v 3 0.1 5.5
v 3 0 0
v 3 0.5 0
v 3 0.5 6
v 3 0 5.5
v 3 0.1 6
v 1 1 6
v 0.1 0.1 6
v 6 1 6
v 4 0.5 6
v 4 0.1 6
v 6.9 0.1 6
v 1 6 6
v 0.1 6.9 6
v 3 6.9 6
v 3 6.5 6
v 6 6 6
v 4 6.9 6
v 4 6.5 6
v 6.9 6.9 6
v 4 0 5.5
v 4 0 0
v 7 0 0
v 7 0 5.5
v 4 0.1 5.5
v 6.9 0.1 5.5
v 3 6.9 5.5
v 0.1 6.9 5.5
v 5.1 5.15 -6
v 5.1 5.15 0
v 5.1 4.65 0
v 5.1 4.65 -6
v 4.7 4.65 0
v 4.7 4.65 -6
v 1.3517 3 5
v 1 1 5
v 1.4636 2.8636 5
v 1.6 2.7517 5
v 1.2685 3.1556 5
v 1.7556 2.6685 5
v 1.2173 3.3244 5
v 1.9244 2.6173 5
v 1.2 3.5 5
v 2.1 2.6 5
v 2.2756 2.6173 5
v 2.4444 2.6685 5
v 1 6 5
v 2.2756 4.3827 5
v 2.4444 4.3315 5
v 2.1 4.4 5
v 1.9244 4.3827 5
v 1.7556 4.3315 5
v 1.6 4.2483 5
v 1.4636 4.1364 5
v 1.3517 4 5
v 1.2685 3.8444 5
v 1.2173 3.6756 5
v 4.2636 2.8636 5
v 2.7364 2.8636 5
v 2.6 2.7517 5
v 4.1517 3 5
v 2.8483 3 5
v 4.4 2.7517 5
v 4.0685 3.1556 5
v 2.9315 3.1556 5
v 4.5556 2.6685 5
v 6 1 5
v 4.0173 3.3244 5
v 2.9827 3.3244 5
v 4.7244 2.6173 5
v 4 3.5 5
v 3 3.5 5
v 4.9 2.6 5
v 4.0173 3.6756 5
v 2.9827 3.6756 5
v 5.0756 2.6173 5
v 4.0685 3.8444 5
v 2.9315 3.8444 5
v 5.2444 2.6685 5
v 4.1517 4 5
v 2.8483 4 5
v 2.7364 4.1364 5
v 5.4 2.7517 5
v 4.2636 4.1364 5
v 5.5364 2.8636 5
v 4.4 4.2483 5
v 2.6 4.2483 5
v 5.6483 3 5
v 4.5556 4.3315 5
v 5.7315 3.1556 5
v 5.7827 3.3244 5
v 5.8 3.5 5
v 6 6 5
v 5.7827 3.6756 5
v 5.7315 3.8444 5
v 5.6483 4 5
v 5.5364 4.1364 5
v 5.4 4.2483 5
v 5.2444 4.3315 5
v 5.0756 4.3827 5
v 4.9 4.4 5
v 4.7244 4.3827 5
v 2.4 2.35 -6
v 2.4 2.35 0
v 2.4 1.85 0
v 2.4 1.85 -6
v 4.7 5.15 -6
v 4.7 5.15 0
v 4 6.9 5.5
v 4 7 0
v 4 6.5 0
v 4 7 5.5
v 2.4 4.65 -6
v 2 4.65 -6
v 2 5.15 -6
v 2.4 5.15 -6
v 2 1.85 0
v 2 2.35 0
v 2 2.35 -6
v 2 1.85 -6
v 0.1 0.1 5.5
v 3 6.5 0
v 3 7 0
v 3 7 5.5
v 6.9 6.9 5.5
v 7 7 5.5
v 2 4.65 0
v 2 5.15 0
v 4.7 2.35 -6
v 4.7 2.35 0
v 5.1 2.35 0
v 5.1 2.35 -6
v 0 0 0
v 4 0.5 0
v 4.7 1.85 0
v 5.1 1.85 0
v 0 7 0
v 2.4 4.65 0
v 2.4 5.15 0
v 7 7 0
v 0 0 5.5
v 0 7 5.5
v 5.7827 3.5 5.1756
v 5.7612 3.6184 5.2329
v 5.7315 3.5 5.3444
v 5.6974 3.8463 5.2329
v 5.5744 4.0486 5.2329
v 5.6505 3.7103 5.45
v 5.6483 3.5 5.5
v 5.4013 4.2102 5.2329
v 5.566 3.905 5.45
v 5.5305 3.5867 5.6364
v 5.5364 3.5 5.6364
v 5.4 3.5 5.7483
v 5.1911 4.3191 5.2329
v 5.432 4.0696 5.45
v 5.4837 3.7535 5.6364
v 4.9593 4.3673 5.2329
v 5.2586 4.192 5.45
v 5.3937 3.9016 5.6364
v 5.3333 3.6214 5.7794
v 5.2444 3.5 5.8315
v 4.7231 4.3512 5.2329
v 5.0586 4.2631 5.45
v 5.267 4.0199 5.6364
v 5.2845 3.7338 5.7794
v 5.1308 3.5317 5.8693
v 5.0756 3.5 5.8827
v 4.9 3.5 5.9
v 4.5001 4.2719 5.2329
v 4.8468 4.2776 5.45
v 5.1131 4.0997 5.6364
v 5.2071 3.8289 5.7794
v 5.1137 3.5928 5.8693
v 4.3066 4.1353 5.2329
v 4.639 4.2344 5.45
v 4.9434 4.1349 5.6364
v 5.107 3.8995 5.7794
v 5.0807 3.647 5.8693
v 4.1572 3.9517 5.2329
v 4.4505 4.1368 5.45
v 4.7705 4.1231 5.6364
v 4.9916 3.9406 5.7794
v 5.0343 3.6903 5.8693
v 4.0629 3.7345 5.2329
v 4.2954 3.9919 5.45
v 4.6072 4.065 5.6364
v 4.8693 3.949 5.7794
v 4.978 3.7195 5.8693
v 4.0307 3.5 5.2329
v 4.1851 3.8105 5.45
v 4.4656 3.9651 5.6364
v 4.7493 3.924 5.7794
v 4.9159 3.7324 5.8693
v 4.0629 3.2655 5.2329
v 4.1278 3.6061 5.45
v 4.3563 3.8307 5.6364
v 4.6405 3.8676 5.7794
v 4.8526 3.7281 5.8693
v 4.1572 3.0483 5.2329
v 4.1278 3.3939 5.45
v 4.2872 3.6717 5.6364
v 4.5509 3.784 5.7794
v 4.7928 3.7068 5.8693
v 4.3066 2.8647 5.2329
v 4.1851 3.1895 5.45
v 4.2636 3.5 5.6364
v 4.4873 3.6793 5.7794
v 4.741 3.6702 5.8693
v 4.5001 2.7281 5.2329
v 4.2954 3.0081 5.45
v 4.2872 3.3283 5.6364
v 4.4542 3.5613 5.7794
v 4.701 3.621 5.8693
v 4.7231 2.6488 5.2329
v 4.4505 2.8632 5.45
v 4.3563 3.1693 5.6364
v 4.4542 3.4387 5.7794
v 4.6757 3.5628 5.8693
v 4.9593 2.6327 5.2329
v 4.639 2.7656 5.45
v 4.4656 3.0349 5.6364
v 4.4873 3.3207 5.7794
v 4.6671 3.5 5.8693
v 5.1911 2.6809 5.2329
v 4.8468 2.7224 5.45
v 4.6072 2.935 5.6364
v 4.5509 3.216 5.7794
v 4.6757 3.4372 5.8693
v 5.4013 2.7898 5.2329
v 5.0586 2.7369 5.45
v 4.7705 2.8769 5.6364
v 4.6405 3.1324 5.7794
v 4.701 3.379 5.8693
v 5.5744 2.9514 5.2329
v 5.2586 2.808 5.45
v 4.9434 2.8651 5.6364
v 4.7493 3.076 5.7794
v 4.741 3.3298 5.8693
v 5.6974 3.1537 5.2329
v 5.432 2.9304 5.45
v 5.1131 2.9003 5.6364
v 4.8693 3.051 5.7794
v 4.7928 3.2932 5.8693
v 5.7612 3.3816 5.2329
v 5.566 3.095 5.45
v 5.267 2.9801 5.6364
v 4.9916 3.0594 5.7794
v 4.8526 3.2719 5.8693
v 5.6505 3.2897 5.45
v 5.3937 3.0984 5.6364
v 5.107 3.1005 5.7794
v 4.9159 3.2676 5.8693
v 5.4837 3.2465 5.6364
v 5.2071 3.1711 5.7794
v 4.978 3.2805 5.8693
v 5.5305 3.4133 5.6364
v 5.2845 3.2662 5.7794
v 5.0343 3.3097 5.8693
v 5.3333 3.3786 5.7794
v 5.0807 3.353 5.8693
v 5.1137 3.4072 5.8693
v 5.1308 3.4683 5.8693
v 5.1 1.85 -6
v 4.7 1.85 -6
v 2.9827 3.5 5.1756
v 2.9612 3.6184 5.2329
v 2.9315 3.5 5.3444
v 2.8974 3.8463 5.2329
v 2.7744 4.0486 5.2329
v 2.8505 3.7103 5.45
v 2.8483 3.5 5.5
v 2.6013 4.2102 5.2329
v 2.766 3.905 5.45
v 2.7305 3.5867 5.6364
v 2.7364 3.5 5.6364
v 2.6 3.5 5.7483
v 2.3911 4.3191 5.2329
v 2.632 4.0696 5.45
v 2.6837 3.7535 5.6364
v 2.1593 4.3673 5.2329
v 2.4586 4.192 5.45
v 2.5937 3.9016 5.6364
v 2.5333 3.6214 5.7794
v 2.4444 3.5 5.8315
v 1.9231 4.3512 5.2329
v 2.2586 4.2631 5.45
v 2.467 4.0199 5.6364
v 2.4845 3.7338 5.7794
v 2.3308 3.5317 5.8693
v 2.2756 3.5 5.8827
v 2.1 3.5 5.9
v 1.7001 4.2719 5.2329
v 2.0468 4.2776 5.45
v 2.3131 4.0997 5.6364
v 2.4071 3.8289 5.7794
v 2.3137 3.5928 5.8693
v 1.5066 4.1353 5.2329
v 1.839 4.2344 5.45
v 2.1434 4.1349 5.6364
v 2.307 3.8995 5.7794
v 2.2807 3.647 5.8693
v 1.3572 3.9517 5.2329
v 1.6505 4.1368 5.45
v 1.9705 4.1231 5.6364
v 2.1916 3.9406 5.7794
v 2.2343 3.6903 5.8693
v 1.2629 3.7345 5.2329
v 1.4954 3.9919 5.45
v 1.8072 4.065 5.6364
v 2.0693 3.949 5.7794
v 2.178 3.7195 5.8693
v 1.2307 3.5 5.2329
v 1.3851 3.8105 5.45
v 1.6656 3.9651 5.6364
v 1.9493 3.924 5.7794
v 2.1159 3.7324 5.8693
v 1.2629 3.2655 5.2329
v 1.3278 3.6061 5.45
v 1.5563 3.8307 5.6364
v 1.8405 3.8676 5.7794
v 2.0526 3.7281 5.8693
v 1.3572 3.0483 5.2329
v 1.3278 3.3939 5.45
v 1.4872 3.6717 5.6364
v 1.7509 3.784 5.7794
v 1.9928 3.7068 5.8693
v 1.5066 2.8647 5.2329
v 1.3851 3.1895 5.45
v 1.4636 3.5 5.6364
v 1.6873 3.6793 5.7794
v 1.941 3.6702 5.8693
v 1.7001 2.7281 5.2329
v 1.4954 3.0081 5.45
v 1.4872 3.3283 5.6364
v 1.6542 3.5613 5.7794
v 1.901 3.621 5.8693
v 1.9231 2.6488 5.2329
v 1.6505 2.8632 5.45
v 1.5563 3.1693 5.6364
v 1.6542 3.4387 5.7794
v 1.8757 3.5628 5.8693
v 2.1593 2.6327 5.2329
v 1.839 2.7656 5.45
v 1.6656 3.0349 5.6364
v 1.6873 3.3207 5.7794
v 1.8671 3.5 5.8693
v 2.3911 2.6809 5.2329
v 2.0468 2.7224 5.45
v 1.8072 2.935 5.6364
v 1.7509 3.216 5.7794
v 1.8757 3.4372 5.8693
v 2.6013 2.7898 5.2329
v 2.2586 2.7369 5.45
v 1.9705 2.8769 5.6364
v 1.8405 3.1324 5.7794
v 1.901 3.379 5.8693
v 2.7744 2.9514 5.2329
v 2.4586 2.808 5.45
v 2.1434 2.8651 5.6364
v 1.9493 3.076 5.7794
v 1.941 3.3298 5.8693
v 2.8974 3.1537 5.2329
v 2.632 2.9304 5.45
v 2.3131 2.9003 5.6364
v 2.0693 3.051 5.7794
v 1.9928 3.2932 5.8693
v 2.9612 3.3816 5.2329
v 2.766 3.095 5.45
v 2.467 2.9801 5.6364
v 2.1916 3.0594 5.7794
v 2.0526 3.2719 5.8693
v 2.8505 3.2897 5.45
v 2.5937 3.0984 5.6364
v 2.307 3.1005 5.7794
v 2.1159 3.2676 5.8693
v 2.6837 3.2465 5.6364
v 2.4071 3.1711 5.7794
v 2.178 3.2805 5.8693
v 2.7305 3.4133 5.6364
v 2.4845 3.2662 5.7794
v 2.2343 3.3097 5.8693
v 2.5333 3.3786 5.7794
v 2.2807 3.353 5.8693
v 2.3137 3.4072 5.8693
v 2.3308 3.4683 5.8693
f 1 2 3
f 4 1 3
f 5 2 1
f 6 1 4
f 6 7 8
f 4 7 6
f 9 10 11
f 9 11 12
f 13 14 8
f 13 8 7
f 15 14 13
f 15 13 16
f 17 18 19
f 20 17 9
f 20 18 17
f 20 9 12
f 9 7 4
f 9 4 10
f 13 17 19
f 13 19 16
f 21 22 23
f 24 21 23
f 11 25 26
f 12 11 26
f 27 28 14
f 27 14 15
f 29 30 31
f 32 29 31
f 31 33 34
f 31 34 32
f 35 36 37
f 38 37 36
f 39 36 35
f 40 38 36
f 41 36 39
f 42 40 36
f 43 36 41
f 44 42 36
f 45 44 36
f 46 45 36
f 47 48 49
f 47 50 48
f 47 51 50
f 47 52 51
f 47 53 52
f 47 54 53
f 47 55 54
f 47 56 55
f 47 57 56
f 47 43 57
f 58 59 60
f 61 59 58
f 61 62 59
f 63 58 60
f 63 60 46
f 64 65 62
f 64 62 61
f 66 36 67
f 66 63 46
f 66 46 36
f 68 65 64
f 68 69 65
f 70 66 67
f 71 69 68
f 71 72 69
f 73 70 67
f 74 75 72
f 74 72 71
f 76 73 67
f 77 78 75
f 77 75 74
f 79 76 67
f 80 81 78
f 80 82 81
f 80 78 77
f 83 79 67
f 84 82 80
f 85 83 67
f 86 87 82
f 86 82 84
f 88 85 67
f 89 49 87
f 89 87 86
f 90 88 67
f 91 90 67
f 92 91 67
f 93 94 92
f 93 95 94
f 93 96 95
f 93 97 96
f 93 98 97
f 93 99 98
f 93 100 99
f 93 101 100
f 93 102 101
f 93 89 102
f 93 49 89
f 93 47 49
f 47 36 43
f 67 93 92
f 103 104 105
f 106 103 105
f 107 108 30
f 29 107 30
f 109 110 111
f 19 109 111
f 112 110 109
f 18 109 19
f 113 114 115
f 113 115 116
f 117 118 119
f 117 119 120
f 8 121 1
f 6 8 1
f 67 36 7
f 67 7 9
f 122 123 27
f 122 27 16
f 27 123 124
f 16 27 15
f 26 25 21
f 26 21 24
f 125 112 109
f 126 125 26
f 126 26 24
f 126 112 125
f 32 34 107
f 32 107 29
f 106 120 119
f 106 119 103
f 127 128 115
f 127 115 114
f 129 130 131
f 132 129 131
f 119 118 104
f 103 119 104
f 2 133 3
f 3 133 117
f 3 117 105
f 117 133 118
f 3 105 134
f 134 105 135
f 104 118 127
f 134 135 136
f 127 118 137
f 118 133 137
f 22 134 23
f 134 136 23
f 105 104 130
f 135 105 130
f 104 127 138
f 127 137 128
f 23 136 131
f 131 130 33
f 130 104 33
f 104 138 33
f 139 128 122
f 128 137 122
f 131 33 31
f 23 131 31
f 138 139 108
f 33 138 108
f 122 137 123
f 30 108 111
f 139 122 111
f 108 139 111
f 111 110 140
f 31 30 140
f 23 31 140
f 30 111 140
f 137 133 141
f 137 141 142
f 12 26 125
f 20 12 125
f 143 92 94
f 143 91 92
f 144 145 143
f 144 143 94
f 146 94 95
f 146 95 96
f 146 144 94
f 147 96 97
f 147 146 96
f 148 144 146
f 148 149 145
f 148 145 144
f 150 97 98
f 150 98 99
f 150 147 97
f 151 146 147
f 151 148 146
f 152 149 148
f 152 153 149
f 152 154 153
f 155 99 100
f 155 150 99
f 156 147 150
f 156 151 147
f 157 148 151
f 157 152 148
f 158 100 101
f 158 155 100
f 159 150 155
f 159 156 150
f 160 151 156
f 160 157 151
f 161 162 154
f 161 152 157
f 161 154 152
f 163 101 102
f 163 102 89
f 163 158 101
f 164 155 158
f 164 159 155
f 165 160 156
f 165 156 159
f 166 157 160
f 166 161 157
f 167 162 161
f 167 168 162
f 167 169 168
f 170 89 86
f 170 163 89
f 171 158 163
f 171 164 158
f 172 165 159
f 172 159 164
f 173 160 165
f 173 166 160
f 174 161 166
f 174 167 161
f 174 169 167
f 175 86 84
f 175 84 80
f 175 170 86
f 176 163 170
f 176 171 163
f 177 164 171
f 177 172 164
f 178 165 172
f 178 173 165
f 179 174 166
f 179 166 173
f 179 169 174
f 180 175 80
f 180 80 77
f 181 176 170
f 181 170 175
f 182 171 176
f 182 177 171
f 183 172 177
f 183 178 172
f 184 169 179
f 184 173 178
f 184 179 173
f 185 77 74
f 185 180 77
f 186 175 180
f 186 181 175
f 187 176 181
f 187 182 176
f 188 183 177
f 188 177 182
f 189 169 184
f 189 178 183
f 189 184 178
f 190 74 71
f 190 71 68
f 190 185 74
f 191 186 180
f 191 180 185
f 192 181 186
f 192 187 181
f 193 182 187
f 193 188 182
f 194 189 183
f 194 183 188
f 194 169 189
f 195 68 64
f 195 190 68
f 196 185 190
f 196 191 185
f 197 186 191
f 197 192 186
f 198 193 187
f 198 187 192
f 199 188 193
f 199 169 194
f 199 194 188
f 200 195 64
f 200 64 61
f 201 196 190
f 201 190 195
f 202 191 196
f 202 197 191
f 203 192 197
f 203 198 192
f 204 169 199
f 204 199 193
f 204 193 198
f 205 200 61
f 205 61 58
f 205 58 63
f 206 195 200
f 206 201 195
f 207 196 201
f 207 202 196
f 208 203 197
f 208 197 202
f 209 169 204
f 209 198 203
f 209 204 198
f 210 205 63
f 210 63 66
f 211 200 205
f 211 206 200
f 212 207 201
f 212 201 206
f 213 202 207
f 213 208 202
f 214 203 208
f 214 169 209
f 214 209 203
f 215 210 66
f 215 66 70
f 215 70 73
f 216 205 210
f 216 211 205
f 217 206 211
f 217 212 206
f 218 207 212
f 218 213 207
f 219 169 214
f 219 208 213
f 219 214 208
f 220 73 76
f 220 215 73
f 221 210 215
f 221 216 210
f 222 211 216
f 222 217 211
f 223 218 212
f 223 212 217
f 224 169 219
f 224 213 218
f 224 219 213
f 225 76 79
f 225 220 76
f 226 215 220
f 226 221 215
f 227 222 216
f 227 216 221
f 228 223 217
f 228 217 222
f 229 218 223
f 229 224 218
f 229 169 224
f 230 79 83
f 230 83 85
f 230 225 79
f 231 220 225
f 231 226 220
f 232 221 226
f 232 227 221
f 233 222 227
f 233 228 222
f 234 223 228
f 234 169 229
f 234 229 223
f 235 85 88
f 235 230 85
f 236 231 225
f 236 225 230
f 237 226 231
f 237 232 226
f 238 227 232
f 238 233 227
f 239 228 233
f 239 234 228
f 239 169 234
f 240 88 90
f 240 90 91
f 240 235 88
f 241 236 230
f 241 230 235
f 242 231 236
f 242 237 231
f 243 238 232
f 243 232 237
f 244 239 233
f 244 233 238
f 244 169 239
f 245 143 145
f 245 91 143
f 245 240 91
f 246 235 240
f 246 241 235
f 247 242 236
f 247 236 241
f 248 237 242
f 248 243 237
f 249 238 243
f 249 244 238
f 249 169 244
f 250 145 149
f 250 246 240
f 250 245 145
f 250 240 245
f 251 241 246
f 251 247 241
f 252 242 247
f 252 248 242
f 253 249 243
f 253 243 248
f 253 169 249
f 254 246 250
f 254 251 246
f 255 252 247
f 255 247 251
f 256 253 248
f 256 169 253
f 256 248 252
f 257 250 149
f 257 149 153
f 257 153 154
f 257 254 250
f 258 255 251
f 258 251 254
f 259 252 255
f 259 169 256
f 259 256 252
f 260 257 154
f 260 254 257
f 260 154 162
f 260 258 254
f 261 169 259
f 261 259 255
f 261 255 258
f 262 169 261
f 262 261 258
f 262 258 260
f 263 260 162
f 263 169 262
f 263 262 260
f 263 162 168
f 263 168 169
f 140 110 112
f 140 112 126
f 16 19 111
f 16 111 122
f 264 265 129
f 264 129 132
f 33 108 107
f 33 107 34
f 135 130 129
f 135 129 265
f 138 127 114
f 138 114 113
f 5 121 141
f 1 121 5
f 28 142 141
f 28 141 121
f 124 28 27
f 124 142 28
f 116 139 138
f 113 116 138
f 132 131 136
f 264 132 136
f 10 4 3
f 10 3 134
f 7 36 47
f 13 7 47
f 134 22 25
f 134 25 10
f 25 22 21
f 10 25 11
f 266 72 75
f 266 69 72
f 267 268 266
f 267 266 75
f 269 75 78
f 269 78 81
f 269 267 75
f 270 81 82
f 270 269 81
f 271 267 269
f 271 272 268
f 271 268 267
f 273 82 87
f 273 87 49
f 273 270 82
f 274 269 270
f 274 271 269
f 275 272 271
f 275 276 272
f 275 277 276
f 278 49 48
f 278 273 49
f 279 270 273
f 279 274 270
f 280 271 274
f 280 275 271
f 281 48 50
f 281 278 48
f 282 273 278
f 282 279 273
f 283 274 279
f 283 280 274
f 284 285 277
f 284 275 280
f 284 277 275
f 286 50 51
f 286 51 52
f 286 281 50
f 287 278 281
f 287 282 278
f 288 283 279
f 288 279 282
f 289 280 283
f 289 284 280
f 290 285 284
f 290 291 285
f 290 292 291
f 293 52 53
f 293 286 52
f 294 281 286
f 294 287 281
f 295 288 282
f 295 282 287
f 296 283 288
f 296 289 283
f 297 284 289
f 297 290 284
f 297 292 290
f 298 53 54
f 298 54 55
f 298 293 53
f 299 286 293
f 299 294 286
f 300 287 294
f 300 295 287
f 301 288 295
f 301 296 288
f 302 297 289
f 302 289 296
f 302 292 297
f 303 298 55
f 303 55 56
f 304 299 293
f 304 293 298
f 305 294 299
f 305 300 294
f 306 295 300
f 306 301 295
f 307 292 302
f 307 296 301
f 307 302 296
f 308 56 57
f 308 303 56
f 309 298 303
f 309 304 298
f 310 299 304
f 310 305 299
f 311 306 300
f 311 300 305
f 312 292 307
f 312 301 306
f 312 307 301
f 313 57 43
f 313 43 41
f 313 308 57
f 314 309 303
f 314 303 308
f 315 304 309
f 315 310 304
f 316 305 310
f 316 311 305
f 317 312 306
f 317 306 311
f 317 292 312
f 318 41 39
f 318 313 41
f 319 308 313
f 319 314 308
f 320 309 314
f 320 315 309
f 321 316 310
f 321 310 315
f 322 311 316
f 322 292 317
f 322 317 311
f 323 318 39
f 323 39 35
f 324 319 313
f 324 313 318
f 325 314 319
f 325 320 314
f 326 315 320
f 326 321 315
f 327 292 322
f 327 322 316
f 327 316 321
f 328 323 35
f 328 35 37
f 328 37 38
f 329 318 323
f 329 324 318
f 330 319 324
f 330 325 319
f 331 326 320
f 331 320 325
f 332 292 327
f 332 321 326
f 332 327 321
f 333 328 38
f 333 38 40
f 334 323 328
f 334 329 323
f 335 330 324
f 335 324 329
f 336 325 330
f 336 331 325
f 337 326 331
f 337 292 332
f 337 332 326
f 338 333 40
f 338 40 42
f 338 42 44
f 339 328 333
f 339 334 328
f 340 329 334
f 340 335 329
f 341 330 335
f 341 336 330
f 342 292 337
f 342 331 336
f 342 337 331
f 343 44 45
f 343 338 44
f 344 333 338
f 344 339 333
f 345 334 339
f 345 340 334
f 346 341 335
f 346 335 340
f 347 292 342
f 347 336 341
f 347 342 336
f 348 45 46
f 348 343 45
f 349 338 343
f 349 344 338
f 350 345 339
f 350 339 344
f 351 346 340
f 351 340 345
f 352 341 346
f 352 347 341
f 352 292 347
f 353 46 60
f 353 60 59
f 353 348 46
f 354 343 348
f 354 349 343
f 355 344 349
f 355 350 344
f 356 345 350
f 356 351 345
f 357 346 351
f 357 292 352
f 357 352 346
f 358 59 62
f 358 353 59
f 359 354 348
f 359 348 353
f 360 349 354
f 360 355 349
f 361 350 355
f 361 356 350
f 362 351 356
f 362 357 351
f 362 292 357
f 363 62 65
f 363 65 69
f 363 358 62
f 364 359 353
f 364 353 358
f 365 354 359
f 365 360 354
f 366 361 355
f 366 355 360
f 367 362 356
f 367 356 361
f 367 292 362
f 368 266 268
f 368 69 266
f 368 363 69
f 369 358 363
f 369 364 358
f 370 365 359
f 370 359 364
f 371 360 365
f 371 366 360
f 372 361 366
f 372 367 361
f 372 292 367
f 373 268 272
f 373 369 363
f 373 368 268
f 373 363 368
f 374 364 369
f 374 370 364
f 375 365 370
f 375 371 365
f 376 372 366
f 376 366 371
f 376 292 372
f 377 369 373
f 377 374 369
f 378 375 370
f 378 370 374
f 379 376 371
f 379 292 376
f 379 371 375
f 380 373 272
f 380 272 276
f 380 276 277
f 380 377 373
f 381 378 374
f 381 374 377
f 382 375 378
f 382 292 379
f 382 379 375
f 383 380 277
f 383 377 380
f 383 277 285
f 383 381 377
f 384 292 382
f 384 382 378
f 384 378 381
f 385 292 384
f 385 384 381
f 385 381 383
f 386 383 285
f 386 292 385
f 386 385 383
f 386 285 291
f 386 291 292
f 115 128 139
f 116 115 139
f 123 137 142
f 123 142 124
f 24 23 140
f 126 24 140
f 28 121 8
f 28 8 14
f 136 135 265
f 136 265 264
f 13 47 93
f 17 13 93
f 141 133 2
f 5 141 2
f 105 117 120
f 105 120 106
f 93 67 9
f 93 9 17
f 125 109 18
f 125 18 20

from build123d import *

# Parameters (mm, degrees)
BOX001_W        = 5
BOX001_H        = 5
BOX001_DEPTH    = 1
BOX002_W        = 6.8
BOX002_H        = 6.8
BOX002_DEPTH    = 0.5
BOX_W           = 7
BOX_H           = 7
BOX_DEPTH       = 5.5
SKETCH_W        = 1
SKETCH_H        = 6
POCKET_DEPTH    = 0.5
SKETCH001_W     = 1
SKETCH001_H     = 6
POCKET001_DEPTH = 0.5
SKETCH002_W     = 0.4
SKETCH002_H     = 0.5
PAD_DEPTH       = 6


with BuildPart() as esf_ra001:
    # Sphere001 → Sphere001 (revolve)
    with BuildSketch(Plane(origin=(4.9, 3.5, 5), x_dir=(1, 0, 0), z_dir=(0, -1, 0))):
        with BuildLine():
            ThreePointArc((0, -0.9), (0.9, 0), (0, 0.9))
            Line((0, 0.9), (0, -0.9))
        make_face()
    revolve(axis=Axis((4.9, 3.5, 5), (0, 0, 1)))


with BuildPart() as esf_ra:
    # Sphere → Sphere (revolve)
    with BuildSketch(Plane(origin=(2.1, 3.5, 5), x_dir=(1, 0, 0), z_dir=(0, -1, 0))):
        with BuildLine():
            ThreePointArc((0, -0.9), (0.9, 0), (0, 0.9))
            Line((0, 0.9), (0, -0.9))
        make_face()
    revolve(axis=Axis((2.1, 3.5, 5), (0, 0, 1)))


with BuildPart() as cubo001:
    # Box001 → Box001 (new body)
    with BuildSketch(Plane(origin=(1, 1, 5), x_dir=(1, 0, 0), z_dir=(0, 0, 1))):
        with Locations((2.5, 2.5)):
            Rectangle(BOX001_W, BOX001_H)
    extrude(amount=BOX001_DEPTH)


with BuildPart() as cubo002:
    # Box002 → Box002 (new body)
    with BuildSketch(Plane(origin=(0.1, 0.1, 5.5), x_dir=(1, 0, 0), z_dir=(0, 0, 1))):
        with Locations((3.4, 3.4)):
            Rectangle(BOX002_W, BOX002_H)
    extrude(amount=BOX002_DEPTH)


with BuildPart() as cny70:
    # Box → Box (new body)
    with BuildSketch(Plane.XY):
        with Locations((3.5, 3.5)):
            Rectangle(BOX_W, BOX_H)
    extrude(amount=BOX_DEPTH)

    # Fusion: union Cubo002
    add(cubo002.part)

    # Cut: cut Cubo001
    add(cubo001.part, mode=Mode.SUBTRACT)

    # Sketch → Pocket (cut)
    with BuildSketch(Plane.XZ):
        with Locations((3.5, 3)):
            Rectangle(SKETCH_W, SKETCH_H)
    extrude(amount=-POCKET_DEPTH, mode=Mode.SUBTRACT)

    # Sketch001 → Pocket001 (cut)
    with BuildSketch(Plane(origin=(0, 7, 0), x_dir=(-1, 0, 0), z_dir=(0, 1, 0))):
        with Locations((-3.5, 3)):
            Rectangle(SKETCH001_W, SKETCH001_H)
    extrude(amount=-POCKET001_DEPTH, mode=Mode.SUBTRACT)

    # Sketch002 → Pad (new body)
    with BuildSketch(Plane(origin=(0, 0, 0), x_dir=(1, 0, 0), z_dir=(0, 0, -1))):
        with Locations((2.2, -2.1)):
            Rectangle(SKETCH002_W, SKETCH002_H)
        with Locations((4.9, -2.1)):
            Rectangle(SKETCH002_W, SKETCH002_H)
        with Locations((4.9, -4.9)):
            Rectangle(SKETCH002_W, SKETCH002_H)
        with Locations((2.2, -4.9)):
            Rectangle(SKETCH002_W, SKETCH002_H)
    extrude(amount=PAD_DEPTH)

    # Fusion001: union Esféra001, Esféra
    add(esf_ra001.part)
    add(esf_ra.part)


solid = cny70.part
